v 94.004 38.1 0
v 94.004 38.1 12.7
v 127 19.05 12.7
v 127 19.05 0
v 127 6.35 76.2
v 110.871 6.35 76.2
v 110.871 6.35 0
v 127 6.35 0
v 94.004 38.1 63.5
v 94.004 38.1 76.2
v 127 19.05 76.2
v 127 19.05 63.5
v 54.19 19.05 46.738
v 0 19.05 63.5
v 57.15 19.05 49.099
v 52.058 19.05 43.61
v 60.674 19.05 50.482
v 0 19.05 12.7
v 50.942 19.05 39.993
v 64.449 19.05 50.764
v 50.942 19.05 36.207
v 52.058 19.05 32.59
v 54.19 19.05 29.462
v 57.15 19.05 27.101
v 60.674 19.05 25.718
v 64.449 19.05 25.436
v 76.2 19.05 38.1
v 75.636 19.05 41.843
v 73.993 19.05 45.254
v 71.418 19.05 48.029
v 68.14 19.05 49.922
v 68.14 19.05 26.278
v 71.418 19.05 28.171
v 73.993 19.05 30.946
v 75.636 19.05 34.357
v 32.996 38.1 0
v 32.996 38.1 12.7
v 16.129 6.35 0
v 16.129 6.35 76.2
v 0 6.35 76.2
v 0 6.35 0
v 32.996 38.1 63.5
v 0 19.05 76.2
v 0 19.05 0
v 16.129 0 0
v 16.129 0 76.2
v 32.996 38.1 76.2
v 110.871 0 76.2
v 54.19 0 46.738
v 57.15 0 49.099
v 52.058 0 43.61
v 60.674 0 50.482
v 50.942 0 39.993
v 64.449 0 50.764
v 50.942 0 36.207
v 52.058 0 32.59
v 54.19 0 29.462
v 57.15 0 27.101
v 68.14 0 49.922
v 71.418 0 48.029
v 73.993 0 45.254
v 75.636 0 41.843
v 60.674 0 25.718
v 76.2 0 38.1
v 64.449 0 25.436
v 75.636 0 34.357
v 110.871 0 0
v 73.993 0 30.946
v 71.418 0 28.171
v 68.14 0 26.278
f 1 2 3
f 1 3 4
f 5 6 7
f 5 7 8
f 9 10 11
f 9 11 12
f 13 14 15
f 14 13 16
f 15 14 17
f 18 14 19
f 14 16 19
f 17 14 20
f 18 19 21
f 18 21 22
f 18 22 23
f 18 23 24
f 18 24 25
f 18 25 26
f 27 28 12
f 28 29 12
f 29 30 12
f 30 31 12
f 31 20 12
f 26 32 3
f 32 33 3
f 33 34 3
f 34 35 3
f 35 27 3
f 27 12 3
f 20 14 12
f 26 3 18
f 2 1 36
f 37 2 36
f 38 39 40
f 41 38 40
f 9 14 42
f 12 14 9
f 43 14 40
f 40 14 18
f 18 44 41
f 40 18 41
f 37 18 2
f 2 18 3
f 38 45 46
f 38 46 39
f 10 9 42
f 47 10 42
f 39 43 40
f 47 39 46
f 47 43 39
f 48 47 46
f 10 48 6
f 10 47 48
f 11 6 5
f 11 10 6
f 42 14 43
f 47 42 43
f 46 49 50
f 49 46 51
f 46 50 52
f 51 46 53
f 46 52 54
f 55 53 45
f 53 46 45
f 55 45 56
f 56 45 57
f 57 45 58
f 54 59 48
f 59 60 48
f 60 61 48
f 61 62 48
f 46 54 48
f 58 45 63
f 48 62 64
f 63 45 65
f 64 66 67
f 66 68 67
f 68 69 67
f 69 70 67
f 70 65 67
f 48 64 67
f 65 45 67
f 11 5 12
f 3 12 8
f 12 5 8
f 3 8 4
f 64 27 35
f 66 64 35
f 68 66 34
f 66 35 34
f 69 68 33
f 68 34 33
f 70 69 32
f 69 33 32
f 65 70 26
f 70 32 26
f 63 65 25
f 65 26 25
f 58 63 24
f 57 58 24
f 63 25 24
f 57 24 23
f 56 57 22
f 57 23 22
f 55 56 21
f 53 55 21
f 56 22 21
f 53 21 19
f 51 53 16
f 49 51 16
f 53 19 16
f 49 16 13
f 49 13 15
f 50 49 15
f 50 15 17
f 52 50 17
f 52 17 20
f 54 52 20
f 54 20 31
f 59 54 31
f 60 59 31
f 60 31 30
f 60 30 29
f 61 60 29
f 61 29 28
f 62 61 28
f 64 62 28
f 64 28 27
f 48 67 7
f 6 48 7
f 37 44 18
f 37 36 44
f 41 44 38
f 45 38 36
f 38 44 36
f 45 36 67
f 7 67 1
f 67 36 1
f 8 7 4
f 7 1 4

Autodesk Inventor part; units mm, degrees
ref_plane "YZ Plane" through (0, 0, 0) normal (1, 0, 0) x (0, 1, 0)
ref_plane "XZ Plane" through (0, 0, 0) normal (0, 1, 0) x (-1, 0, 0)
ref_plane "XY Plane" through (0, 0, 0) normal (0, 0, 1) x (1, 0, 0)
sketch "Sketch1" plane through (0, 0, 0) normal (0, 0, 1) x (1, 0, 0)
  line L0 (0, 0) -> (127, 0)
  line L1 (127, 0) -> (127, 38.1)
  line L2 (127, 38.1) -> (0, 38.1)
  line L3 (0, 38.1) -> (0, 0)
  line L4 (0, 0) -> (16.129, 0)
  line L5 (127, 0) -> (110.871, 0)
  line L6 (16.129, 0) -> (16.129, 6.35)
  line L7 (16.129, 6.35) -> (0, 6.35)
  line L8 (110.871, 0) -> (110.871, 6.35)
  line L9 (110.871, 6.35) -> (127, 6.35)
  dimension "d0" = 127
  dimension "d1" = 38.1
  dimension "d2" = 16.129
  dimension "d3" = 16.129
  dimension "d4" = 6.35
  dimension "d5" = 6.35
extrude "Extrusion1" add sketch "Sketch1" along normal blind 76.2 contours L6 L7 L3 L2 L1 L9 L8 L0
chamfer "Chamfer5" distance 19.05 angle 60 1 edges at (127, 38.1, 38.1) measured on face at (127, 16.9333, 25.4)
chamfer "Chamfer6" distance 19.05 angle 60 1 edges at (0, 38.1, 38.1) measured on face at (0, 27.5167, 25.4)
sketch "Sketch8" plane through (127, 6.35, 76.2) normal (1, 0, 0) x (0, 0, -1)
  line L0 (0, 31.75) -> (0, 12.7) projected
  line L1 (0, 12.7) -> (12.7, 12.7)
  line L2 (0, 12.7) -> (76.2, 12.7) projected
  line L3 (12.7, 12.7) -> (12.7, 39.5471)
  line L4 (76.2, 12.7) -> (63.5, 12.7)
  line L5 (63.5, 12.7) -> (63.5, 39.5471)
  line L6 (12.7, 39.5471) -> (63.5, 39.5471)
  point P0 (76.2, -6.35)
  dimension "d37" = 12.7
  dimension "d38" = 12.7
extrude "Extrusion5" cut sketch "Sketch8" against normal blind 254
sketch "Sketch9" plane through (127, 19.05, 63.5) normal (0, 1, 0) x (1, 0, 0)
  line L0 (-127, 50.8) -> (-127, 0) projected
  line L1 (0, 0) -> (-127, 0) projected
  line L2 (0, 0) -> (0, 50.8) projected
  line L3 (0, 50.8) -> (-127, 50.8) projected
  line L4 (-94.0044, 50.8) -> (-32.9956, 50.8) projected
  line L5 (-63.5, 50.8) -> (-63.5, 0)
  circle A0 centre (-63.5, 25.4) radius 12.7
  point P0 (-127, 63.5)
  dimension "d41" = 25.4
extrude "Extrusion6" cut sketch "Sketch9" against normal blind 254 contours A0 L5 | L5 A0
properties part number "Block2" material "Stainless Steel"
